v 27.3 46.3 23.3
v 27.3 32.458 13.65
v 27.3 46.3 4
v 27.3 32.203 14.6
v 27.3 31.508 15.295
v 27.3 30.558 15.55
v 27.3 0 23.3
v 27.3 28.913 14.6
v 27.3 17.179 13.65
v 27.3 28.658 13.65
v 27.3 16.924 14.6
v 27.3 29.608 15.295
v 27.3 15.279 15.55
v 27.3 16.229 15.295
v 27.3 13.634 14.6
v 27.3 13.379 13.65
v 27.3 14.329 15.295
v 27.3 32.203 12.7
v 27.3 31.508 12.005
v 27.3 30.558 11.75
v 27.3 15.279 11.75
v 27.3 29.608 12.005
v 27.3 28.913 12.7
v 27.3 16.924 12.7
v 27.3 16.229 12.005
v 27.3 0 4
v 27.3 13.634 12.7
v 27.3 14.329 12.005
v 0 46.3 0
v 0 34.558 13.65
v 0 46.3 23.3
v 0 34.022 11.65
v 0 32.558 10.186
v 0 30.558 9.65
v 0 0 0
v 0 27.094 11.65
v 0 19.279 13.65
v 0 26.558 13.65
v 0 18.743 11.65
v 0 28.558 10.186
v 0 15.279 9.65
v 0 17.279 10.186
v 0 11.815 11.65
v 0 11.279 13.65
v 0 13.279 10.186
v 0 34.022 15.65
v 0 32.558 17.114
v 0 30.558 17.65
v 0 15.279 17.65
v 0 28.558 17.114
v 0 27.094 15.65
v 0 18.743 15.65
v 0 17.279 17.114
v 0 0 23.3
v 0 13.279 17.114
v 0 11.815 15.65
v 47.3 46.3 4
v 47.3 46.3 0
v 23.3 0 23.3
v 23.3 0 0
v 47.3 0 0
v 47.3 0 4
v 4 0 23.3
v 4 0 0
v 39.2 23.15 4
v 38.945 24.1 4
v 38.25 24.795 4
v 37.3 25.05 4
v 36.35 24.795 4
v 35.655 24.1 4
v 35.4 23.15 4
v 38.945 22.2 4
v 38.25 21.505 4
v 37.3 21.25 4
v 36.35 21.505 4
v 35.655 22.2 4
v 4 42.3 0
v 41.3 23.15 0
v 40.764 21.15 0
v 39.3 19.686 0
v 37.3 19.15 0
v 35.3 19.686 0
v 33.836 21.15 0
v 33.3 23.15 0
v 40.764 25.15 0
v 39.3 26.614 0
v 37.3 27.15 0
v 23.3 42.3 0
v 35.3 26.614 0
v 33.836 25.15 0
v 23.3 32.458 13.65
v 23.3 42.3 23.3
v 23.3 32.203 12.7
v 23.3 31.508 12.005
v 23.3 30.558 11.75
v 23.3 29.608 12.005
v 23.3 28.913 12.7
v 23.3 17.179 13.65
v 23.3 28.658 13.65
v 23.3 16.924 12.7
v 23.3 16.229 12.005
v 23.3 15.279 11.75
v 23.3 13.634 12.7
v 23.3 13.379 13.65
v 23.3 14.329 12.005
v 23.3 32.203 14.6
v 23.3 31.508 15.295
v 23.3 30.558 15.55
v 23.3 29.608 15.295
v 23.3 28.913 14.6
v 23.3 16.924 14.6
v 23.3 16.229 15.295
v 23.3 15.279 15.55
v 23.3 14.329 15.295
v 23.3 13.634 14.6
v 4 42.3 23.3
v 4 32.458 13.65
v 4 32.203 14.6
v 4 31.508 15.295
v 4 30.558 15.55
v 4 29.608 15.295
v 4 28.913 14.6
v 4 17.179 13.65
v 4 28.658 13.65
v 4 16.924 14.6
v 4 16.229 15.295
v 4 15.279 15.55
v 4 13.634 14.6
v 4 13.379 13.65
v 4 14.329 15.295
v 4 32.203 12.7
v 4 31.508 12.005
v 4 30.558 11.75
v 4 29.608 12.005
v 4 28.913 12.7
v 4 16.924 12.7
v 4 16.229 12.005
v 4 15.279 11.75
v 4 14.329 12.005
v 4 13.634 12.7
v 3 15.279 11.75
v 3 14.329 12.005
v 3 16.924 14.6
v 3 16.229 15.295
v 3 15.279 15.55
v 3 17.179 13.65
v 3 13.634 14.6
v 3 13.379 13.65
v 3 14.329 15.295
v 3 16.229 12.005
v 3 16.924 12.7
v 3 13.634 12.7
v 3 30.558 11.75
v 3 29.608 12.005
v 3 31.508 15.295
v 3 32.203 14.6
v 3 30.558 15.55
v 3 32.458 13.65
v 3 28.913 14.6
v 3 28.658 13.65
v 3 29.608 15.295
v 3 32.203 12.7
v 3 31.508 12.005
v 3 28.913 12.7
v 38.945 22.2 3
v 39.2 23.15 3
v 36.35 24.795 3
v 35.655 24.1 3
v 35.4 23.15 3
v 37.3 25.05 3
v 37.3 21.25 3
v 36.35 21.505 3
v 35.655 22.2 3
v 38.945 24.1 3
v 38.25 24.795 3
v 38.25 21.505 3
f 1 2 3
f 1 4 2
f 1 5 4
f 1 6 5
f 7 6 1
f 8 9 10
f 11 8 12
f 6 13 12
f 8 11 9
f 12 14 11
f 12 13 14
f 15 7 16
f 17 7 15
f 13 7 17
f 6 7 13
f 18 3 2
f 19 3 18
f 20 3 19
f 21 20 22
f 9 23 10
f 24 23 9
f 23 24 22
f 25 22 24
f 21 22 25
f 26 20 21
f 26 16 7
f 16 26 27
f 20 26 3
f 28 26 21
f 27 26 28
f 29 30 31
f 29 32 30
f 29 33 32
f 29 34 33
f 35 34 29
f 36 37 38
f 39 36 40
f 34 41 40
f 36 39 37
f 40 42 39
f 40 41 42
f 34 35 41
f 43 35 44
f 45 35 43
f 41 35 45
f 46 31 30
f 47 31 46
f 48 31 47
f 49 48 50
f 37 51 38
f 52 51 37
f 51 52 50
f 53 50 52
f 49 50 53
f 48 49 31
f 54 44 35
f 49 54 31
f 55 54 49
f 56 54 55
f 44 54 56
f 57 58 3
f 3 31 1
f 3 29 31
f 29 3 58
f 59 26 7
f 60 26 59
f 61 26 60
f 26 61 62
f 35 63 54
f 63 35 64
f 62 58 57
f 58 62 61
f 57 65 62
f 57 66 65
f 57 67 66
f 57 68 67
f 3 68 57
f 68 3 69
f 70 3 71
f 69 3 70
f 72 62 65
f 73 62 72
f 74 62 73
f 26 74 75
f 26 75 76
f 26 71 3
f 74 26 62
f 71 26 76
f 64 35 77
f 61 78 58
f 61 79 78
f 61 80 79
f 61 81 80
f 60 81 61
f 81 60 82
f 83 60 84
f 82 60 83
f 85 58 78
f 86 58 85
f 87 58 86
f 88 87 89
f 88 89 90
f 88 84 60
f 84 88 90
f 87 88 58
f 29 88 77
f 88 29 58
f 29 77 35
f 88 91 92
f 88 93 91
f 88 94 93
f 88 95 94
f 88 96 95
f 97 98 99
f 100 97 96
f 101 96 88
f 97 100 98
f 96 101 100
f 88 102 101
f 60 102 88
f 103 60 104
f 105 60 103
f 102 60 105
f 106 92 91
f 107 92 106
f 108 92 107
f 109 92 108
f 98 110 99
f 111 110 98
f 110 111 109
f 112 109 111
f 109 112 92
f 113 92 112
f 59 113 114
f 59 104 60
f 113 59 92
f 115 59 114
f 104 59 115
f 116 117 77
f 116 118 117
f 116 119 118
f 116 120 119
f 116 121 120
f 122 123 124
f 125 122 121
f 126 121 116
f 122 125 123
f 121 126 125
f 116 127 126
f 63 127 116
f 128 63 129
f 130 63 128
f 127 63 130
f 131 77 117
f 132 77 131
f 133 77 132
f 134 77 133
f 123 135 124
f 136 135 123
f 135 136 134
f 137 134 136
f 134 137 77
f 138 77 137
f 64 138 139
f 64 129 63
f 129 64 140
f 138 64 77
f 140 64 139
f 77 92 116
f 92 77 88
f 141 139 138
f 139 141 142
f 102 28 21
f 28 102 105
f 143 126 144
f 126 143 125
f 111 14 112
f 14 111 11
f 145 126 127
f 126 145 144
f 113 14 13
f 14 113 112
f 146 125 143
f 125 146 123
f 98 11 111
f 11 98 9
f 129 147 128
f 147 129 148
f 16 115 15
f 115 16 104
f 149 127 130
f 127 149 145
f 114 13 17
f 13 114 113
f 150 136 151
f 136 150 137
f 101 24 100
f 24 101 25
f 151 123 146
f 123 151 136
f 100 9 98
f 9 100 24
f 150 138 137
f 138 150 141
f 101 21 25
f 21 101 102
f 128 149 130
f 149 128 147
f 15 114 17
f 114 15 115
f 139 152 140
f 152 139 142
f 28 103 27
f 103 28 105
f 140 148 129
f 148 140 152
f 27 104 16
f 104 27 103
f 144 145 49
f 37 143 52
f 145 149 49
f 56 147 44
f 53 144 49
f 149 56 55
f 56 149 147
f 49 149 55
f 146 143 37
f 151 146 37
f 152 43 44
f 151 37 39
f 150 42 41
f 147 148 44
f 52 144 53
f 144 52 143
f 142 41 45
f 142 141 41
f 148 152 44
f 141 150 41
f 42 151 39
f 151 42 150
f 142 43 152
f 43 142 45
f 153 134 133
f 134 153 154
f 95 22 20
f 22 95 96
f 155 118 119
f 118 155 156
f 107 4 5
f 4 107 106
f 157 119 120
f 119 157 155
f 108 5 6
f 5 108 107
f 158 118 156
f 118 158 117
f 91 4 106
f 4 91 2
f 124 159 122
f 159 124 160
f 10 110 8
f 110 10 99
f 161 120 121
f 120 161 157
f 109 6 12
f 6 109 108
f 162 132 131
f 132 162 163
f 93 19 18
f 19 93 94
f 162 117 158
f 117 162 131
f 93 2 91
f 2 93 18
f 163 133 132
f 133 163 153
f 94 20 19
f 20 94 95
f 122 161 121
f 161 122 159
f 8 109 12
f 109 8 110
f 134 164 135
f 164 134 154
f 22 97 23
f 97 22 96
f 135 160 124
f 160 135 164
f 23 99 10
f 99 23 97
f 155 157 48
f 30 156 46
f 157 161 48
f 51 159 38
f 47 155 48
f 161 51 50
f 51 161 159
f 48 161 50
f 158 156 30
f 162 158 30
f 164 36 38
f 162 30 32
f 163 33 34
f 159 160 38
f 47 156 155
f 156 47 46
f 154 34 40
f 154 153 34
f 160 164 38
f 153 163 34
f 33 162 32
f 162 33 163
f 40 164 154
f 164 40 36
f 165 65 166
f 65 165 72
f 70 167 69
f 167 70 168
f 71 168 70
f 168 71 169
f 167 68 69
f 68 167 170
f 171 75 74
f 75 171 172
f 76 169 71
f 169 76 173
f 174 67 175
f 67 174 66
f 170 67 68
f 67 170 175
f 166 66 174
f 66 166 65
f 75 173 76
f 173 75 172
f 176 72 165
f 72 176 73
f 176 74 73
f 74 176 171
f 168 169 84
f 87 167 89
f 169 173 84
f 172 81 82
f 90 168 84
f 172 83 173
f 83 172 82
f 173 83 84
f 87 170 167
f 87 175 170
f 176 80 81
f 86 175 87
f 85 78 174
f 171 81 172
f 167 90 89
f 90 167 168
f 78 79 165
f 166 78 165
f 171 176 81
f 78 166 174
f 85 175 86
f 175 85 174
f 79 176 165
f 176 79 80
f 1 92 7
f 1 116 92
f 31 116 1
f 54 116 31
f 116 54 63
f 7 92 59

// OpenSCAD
difference(){
	union() {
		translate(v = [0, 0, 0]) {
			translate(v = [0, 0, -50]) {
				cube(size = [27.3000000000, 46.3000000000, 100]);
			}
		}
		translate(v = [27.3000000000, 0, 0]) {
			cube(size = [20, 46.3000000000, 4]);
		}
	}
	/* Holes Below*/
	union(){
		translate(v = [0, 0, 0]){
			translate(v = [0, 0, -50]){
				translate(v = [4, -1, 0]) {
					cube(size = [19.3000000000, 43.3000000000, 100]);
				}
			}
			translate(v = [13.6500000000, 46.3000000000, -20]) {
				rotate(a = -90, v = [1, 0, 0]) {
					union() {
						union() {
							translate(v = [0, 0, -5]) {
								cylinder($fn = 12, h = 5, r = 1.9000000000);
							}
							translate(v = [0, 0, -3]) {
								cylinder($fn = 12, h = 3, r1 = 1.9000000000, r2 = 4);
							}
						}
						cylinder($fn = 12, h = 1, r = 4);
					}
				}
			}
		}
		translate(v = [0, 15.2790000000, 13.6500000000]) {
			rotate(a = -90, v = [0, 1, 0]) {
				union() {
					union() {
						translate(v = [0, 0, -28.3000000000]) {
							cylinder($fn = 12, h = 28.3000000000, r = 1.9000000000);
						}
						translate(v = [0, 0, -3]) {
							cylinder($fn = 12, h = 3, r1 = 1.9000000000, r2 = 4);
						}
					}
					cylinder($fn = 12, h = 1, r = 4);
				}
			}
		}
		translate(v = [0, 30.5580000000, 13.6500000000]) {
			rotate(a = -90, v = [0, 1, 0]) {
				union() {
					union() {
						translate(v = [0, 0, -28.3000000000]) {
							cylinder($fn = 12, h = 28.3000000000, r = 1.9000000000);
						}
						translate(v = [0, 0, -3]) {
							cylinder($fn = 12, h = 3, r1 = 1.9000000000, r2 = 4);
						}
					}
					cylinder($fn = 12, h = 1, r = 4);
				}
			}
		}
		translate(v = [37.3000000000, 23.1500000000, 0]) {
			rotate(a = 180, v = [0, 1, 0]) {
				union() {
					union() {
						translate(v = [0, 0, -5]) {
							cylinder($fn = 12, h = 5, r = 1.9000000000);
						}
						translate(v = [0, 0, -3]) {
							cylinder($fn = 12, h = 3, r1 = 1.9000000000, r2 = 4);
						}
					}
					cylinder($fn = 12, h = 1, r = 4);
				}
			}
		}
		translate(v = [-100, -100, -100]) {
			cube(size = [200, 200, 100]);
		}
		translate(v = [-100, -100, 23.3000000000]) {
			cube(size = [200, 200, 100]);
		}
	} /* End Holes */ 
}
